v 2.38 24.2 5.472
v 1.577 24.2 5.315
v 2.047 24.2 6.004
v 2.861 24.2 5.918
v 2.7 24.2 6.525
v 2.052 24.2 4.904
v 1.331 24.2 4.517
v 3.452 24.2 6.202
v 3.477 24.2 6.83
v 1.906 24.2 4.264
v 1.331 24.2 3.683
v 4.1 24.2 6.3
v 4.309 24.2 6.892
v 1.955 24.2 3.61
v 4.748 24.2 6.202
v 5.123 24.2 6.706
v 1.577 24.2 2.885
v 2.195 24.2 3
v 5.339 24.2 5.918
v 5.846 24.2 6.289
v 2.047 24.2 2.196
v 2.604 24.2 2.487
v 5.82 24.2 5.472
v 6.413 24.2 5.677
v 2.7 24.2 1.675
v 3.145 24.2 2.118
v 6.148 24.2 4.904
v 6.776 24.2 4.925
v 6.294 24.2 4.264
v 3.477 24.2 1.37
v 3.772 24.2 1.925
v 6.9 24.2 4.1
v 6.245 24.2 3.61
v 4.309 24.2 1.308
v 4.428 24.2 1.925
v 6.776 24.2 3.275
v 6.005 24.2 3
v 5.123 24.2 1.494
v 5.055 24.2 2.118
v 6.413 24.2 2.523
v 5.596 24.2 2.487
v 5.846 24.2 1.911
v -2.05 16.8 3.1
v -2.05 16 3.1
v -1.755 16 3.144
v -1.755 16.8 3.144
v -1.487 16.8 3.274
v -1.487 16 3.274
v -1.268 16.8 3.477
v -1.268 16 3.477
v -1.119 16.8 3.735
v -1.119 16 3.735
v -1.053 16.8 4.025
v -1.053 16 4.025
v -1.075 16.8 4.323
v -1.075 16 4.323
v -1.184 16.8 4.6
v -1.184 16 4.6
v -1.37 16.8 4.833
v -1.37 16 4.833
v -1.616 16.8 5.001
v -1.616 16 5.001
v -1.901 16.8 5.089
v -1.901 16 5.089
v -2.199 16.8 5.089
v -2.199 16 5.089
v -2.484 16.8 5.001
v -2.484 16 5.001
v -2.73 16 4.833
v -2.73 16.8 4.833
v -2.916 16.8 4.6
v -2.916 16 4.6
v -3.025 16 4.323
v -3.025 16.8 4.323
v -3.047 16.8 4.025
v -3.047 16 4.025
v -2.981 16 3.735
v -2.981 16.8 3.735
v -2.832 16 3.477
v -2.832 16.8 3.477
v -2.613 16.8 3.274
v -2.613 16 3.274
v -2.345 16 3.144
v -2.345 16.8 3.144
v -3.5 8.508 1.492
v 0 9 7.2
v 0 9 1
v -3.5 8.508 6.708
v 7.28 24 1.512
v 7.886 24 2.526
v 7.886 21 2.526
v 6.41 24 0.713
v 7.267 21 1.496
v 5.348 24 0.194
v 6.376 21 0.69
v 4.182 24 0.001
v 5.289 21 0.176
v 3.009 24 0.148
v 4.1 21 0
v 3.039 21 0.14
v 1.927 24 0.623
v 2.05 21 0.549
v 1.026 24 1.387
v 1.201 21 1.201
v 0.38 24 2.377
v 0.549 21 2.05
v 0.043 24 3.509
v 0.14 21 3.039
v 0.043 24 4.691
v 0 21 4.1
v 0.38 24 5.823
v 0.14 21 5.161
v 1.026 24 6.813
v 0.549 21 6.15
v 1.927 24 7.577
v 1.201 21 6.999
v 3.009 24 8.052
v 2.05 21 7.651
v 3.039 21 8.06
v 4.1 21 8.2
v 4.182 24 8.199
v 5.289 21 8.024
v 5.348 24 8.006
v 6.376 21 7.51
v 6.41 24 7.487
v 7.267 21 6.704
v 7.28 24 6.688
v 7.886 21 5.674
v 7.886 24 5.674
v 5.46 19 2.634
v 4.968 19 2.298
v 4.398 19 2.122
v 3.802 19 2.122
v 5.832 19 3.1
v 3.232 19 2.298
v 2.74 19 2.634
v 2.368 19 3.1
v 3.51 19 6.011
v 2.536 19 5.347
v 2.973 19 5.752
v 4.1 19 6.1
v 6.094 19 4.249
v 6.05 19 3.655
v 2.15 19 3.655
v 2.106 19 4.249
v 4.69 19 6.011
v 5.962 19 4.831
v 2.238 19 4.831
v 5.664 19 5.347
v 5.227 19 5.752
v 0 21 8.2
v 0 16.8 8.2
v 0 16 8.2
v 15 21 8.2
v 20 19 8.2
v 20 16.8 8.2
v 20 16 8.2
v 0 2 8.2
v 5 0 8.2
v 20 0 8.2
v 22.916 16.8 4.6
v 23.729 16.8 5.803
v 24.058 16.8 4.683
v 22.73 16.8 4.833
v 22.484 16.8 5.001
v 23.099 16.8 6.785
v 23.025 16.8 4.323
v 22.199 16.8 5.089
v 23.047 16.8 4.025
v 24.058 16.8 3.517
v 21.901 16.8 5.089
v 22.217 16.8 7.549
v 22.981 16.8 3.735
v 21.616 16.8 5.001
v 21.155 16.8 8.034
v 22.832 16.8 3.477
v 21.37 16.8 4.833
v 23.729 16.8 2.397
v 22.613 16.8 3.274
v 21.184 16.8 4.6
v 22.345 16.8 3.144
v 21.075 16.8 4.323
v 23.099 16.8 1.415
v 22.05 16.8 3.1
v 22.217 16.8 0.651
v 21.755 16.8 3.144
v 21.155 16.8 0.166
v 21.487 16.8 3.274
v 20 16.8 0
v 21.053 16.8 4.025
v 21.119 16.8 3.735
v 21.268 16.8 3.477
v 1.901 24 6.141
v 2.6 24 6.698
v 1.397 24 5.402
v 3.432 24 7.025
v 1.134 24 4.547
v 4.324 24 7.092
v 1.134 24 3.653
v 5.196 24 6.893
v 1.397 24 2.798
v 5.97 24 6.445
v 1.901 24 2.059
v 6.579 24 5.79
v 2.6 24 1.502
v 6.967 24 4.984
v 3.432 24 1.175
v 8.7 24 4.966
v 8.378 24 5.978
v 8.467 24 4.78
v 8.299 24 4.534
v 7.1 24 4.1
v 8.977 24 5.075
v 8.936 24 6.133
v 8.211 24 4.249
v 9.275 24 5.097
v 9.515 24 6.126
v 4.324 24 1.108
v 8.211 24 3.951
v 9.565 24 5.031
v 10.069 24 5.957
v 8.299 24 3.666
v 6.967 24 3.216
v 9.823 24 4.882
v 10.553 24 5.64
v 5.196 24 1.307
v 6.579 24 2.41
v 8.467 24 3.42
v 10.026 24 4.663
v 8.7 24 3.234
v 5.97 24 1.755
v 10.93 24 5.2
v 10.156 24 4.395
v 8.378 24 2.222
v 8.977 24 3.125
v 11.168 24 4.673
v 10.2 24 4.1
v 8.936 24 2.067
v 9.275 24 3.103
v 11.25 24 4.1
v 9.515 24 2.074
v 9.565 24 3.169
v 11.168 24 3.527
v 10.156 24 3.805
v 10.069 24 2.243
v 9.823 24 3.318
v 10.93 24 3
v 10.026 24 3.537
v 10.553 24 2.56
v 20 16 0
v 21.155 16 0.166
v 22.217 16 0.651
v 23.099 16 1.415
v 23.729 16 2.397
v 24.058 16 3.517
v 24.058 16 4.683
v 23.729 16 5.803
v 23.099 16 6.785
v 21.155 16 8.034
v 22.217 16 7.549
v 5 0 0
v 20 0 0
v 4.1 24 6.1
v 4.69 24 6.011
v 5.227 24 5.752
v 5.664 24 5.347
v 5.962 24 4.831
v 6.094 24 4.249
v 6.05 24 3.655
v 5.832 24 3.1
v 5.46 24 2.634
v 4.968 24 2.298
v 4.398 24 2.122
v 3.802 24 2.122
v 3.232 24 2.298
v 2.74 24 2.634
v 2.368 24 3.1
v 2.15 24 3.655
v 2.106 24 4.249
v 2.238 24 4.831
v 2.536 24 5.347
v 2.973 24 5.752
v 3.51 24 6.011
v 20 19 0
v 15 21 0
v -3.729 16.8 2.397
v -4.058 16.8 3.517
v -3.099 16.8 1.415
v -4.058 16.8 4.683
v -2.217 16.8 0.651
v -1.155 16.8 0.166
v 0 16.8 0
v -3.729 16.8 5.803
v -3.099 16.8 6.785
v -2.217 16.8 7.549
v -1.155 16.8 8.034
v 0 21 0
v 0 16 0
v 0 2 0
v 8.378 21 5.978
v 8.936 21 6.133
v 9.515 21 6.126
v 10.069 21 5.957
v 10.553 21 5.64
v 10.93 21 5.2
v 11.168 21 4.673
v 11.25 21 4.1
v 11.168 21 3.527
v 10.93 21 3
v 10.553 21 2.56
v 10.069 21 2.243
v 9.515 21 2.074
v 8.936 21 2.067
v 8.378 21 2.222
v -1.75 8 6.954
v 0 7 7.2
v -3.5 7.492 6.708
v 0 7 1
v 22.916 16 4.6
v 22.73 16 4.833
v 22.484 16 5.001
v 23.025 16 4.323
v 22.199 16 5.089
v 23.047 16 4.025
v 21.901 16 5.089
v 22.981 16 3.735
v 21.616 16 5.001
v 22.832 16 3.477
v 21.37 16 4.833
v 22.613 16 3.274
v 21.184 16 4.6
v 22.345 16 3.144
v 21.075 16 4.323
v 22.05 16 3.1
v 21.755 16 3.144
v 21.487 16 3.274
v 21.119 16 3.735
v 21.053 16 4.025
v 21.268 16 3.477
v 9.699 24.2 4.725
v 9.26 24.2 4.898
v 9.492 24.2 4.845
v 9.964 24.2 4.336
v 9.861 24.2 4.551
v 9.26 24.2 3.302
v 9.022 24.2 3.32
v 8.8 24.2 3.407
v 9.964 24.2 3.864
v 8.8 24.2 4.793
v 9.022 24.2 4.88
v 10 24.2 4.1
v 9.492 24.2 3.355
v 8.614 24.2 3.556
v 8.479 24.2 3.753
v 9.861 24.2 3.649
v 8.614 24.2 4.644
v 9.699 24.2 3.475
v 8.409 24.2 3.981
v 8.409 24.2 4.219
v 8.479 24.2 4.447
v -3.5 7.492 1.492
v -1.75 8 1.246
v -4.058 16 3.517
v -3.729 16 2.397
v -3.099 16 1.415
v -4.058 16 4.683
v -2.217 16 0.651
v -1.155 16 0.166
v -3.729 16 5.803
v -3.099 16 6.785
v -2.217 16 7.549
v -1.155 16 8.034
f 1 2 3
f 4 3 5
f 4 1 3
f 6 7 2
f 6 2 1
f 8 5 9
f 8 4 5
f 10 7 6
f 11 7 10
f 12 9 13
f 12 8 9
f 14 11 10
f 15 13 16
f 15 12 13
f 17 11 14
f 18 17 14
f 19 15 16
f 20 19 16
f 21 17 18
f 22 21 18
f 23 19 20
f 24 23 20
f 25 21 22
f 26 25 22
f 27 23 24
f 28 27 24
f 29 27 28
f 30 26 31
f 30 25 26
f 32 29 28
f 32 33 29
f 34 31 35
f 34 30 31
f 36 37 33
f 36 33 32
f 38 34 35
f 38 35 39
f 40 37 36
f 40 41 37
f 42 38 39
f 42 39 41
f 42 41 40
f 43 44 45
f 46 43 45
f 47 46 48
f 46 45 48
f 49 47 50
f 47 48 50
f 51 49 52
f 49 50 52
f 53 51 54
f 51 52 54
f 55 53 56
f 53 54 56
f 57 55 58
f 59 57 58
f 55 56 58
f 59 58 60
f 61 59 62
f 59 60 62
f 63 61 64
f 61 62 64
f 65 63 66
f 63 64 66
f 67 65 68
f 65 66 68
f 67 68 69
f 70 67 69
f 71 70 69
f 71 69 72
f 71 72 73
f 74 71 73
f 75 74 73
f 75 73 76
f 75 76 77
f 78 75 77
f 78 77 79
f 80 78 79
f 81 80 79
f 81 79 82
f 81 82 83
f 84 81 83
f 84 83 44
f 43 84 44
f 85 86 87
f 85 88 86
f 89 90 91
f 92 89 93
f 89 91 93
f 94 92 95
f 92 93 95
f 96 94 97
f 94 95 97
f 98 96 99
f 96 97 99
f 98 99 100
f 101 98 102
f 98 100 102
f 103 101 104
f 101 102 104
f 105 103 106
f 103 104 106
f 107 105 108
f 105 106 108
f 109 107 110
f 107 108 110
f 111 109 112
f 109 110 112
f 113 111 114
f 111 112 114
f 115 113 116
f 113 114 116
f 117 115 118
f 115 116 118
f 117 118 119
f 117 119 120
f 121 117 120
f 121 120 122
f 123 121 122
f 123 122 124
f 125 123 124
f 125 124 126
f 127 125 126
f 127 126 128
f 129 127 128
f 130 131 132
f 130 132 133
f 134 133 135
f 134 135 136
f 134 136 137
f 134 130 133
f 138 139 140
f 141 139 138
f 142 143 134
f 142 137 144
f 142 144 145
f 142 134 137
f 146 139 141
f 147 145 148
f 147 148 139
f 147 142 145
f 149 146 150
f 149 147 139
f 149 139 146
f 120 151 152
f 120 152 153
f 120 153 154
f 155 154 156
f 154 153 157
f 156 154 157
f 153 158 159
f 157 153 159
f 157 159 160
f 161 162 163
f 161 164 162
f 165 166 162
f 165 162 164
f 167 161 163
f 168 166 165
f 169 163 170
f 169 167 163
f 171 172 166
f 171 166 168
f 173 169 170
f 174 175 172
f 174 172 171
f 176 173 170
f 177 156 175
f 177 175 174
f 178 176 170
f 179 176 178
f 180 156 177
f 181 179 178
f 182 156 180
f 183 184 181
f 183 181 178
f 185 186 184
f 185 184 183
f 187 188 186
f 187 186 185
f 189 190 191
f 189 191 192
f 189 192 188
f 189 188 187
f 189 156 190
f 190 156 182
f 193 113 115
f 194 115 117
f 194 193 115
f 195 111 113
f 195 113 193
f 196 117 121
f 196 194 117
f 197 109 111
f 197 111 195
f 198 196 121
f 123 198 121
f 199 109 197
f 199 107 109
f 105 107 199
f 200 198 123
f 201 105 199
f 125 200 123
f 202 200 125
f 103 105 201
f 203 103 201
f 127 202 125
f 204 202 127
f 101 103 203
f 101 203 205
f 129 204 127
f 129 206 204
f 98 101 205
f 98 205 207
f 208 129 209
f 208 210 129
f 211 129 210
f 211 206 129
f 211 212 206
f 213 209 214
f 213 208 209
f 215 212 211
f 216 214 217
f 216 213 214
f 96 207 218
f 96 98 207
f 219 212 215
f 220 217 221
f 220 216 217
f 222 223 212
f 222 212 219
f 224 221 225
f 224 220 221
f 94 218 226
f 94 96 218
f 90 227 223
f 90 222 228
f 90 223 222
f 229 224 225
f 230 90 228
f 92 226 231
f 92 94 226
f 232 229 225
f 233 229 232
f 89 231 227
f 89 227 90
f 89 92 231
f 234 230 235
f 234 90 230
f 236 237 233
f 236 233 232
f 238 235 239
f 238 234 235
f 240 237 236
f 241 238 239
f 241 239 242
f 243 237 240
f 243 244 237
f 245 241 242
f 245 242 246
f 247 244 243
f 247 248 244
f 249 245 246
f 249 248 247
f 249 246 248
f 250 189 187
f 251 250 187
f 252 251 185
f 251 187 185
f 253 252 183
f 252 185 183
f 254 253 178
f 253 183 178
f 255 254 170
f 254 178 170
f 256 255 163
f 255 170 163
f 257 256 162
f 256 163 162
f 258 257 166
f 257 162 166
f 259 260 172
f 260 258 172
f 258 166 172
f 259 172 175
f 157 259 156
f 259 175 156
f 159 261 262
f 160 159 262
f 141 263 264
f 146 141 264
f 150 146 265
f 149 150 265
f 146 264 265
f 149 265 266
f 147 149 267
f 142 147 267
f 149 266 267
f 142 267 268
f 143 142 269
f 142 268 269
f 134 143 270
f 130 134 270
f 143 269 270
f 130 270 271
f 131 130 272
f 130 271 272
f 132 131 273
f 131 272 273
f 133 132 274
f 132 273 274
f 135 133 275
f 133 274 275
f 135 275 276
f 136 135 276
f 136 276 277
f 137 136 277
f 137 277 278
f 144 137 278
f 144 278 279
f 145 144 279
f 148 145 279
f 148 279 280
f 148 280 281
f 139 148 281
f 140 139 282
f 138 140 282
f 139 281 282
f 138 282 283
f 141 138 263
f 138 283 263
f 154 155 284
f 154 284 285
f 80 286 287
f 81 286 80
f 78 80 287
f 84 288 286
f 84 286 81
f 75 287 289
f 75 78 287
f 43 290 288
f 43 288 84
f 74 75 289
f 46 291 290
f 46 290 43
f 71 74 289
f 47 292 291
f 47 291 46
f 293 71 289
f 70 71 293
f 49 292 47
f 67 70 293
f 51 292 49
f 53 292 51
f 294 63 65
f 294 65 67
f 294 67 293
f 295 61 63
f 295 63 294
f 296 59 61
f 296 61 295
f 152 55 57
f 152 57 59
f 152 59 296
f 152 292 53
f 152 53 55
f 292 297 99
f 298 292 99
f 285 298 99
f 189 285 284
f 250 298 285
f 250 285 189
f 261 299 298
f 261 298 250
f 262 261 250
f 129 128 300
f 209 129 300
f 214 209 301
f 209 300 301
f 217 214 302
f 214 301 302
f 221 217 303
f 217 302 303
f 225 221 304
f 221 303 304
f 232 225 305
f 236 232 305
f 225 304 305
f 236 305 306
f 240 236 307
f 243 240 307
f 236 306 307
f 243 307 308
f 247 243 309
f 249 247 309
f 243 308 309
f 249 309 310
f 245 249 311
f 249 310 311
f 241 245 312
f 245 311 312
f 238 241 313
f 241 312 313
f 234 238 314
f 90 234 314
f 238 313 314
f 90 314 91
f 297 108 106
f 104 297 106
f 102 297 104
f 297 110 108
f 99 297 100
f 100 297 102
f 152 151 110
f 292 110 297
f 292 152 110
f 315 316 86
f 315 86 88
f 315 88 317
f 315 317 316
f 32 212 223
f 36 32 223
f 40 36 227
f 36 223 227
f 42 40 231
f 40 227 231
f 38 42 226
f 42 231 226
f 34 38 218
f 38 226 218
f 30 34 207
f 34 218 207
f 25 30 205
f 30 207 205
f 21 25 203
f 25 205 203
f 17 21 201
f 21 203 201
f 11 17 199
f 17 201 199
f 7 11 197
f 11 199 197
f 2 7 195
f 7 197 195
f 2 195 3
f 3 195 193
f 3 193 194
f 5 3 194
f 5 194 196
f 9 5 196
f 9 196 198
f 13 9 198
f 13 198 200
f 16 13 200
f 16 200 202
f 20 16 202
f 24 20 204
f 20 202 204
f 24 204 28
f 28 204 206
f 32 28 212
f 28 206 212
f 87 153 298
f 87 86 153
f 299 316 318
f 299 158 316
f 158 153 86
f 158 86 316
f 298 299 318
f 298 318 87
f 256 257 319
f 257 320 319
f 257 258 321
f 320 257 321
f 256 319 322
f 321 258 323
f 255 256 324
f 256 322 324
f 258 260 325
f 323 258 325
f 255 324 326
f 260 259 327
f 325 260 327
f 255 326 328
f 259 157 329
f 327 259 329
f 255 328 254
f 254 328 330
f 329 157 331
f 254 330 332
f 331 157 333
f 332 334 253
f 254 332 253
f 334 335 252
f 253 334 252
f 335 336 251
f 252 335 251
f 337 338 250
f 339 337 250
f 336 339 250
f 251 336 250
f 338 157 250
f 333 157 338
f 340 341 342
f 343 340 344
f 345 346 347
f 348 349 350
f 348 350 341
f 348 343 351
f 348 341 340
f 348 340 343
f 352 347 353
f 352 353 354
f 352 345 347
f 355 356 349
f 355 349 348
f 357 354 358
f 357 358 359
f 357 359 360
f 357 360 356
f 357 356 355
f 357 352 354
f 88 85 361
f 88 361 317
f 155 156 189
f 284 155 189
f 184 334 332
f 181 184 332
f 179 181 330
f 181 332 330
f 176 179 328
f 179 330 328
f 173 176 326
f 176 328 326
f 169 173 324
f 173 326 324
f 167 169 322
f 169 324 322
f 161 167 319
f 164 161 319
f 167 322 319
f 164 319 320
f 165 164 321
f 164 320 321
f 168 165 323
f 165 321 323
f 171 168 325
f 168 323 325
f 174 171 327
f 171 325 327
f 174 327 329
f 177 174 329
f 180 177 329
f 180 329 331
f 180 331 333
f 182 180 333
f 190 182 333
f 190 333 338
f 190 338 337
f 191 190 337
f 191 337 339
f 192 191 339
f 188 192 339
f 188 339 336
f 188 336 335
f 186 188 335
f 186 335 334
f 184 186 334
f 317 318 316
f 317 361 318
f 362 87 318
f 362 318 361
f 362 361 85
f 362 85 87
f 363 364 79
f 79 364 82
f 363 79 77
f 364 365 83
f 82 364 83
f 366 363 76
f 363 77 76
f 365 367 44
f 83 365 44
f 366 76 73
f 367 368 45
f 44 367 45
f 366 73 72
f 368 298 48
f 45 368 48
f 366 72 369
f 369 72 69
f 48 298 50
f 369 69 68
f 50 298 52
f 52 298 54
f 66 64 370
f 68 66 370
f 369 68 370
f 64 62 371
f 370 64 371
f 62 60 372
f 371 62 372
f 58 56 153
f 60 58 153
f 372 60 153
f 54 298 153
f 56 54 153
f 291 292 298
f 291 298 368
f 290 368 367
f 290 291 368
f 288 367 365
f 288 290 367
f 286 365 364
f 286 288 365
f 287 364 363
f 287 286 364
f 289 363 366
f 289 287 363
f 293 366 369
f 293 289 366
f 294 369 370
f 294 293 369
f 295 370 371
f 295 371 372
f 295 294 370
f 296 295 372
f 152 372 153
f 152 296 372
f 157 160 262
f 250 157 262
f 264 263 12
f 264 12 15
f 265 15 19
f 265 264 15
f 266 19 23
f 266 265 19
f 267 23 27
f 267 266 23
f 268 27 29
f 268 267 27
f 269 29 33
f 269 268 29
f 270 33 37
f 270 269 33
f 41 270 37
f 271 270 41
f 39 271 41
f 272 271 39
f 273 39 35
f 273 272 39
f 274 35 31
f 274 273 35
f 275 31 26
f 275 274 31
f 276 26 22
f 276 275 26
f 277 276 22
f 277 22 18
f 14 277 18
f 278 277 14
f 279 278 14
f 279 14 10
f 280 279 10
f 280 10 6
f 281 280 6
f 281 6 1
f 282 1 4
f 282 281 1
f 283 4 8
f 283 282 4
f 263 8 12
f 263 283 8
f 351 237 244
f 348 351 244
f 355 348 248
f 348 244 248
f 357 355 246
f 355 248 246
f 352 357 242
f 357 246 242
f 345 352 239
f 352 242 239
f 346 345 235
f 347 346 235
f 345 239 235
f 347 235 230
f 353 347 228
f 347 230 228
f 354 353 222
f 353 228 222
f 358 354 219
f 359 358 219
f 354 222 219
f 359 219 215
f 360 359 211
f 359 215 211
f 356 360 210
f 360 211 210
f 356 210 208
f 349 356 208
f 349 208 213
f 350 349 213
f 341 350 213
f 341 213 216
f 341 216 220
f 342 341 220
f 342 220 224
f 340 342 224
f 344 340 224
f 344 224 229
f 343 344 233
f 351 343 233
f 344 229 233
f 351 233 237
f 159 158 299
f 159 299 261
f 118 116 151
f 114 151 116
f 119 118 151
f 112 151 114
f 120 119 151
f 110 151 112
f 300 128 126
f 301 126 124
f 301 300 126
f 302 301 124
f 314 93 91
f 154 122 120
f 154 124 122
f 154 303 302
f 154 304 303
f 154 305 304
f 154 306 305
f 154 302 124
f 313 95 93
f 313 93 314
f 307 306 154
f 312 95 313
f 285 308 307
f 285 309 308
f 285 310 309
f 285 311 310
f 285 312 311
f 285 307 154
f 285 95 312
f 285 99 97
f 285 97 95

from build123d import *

# Parameters (mm, degrees)
SKETCH1_W                      = 20
SKETCH1_H                      = 8.2
BOSS_EXTRUDE1_DEPTH            = 21
SKETCH2_W                      = 8.2
SKETCH2_H                      = 0.8
BOSS_EXTRUDE2_DEPTH            = 5
SKETCH3_W                      = 8.2
SKETCH3_H                      = 0.8
BOSS_EXTRUDE3_DEPTH            = 5
CUT_EXTRUDE1_REACH             = 35.664
CUT_EXTRUDE2_REACH             = 33.217
F_2_0_2_DIAMETER_HOLE1_D       = 2
BOSS_EXTRUDE6_DEPTH            = 3
CUT_EXTRUDE4_REACH             = 36.986
SKETCH12_W                     = 6.2
SKETCH12_H                     = 2
BOSS_EXTRUDE7_DEPTH            = 3.5
BOSS_EXTRUDE7_TAPER            = 8
SKETCH15_R                     = 2
CUT_EXTRUDE5_DEPTH             = 5
SKETCH17_R                     = 3
SKETCH17_R_2                   = 2
BOSS_EXTRUDE10_DEPTH           = 0.2
BOSS_EXTRUDE10_DRAFT           = 45
SKETCH17_R_3                   = 1
BOSS_EXTRUDE10_PROFILE_2_DEPTH = 0.2
BOSS_EXTRUDE10_PROFILE_2_DRAFT = 45


with BuildPart() as part:
    # Sketch1 → Boss-Extrude1 (new body)
    with BuildSketch(Plane(origin=(0, 0, 0), x_dir=(1, 0, 0), z_dir=(0, 1, 0))):
        with Locations((10, -4.1)):
            Rectangle(SKETCH1_W, SKETCH1_H)
    extrude(amount=BOSS_EXTRUDE1_DEPTH)

    # Sketch2 → Boss-Extrude2 (add)
    with BuildSketch(Plane(origin=(20, 0, 0), x_dir=(0, 0, -1), z_dir=(1, 0, 0))):
        with Locations((-4.1, 16.4)):
            Rectangle(SKETCH2_W, SKETCH2_H)
    extrude(amount=BOSS_EXTRUDE2_DEPTH)

    # Sketch3 → Boss-Extrude3 (add)
    with BuildSketch(Plane.ZY):
        with Locations((4.1, 16.4)):
            Rectangle(SKETCH3_W, SKETCH3_H)
    extrude(amount=BOSS_EXTRUDE3_DEPTH)

    # Sketch4 → Cut-Extrude1 (cut, up to next)
    with BuildSketch(Plane.XY.offset(8.2), mode=Mode.PRIVATE) as cut_extrude1_sk1:
        Polygon((20, 19), (15, 21), (20, 21), align=None)
    cut_extrude1_tool1 = extrude(cut_extrude1_sk1.sketch, amount=-CUT_EXTRUDE1_REACH, mode=Mode.PRIVATE) & part.part
    add(cut_extrude1_tool1.solids().sort_by_distance((18.333333, 20.333333, 8.2))[0], mode=Mode.SUBTRACT)

    # Sketch8 → Cut-Extrude2 (cut, up to next)
    with BuildSketch(Plane(origin=(0, 16.8, 0), x_dir=(1, 0, 0), z_dir=(0, 1, 0)), mode=Mode.PRIVATE) as cut_extrude2_sk1:
        with BuildLine():
            Line((-5, 0), (0, 0))
            ThreePointArc((0, 0), (-4.1, -4.1), (0, -8.2))
            Line((0, -8.2), (-5, -8.2))
            Line((-5, -8.2), (-5, 0))
        make_face()
    cut_extrude2_tool1 = extrude(cut_extrude2_sk1.sketch, amount=-CUT_EXTRUDE2_REACH, mode=Mode.PRIVATE) & part.part
    # Sketch8 → Cut-Extrude2 (cut, up to next)
    with BuildSketch(Plane(origin=(0, 16.8, 0), x_dir=(1, 0, 0), z_dir=(0, 1, 0)), mode=Mode.PRIVATE) as cut_extrude2_sk2:
        with BuildLine():
            Line((20, -8.2), (25, -8.2))
            Line((25, -8.2), (25, 0))
            Line((25, 0), (20, 0))
            ThreePointArc((20, 0), (24.1, -4.1), (20, -8.2))
        make_face()
    cut_extrude2_tool2 = extrude(cut_extrude2_sk2.sketch, amount=-CUT_EXTRUDE2_REACH, mode=Mode.PRIVATE) & part.part
    add(cut_extrude2_tool1.solids().sort_by_distance((-2.5, 16.8, 8.103958))[0], mode=Mode.SUBTRACT)
    add(cut_extrude2_tool2.solids().sort_by_distance((24.196042, 16.8, 4.1))[0], mode=Mode.SUBTRACT)

    # Ø2.0 (2) Diameter Hole1 (through all)
    with Locations(Plane(origin=(-2.05, 16.8, 4.1), x_dir=(0, 0, 1), z_dir=(0, 1, 0))):
        with Locations((0, 0), (0, 24.1)):
            Hole(F_2_0_2_DIAMETER_HOLE1_D / 2)

    # Sketch10 → Boss-Extrude6 (add)
    with BuildSketch(Plane(origin=(0, 21, 0), x_dir=(1, 0, 0), z_dir=(0, 1, 0))):
        with BuildLine():
            ThreePointArc((7.886029412, -2.526474883), (0, -4.1), (7.886029412, -5.673525117))
            ThreePointArc((7.886029412, -5.673525117), (11.25, -4.1), (7.886029412, -2.526474883))
        make_face()
    extrude(amount=BOSS_EXTRUDE6_DEPTH)

    # Sketch11 → Cut-Extrude4 (cut, up to next)
    with BuildSketch(Plane.XY.offset(8.2), mode=Mode.PRIVATE) as cut_extrude4_sk1:
        Polygon((0, 0), (0, 2), (5, 0), align=None)
    cut_extrude4_tool1 = extrude(cut_extrude4_sk1.sketch, amount=-CUT_EXTRUDE4_REACH, mode=Mode.PRIVATE) & part.part
    add(cut_extrude4_tool1.solids().sort_by_distance((1.666667, 0.666667, 8.2))[0], mode=Mode.SUBTRACT)

    # Sketch12 → Boss-Extrude7 (add)
    with BuildSketch(Plane.ZY):
        with Locations((4.1, 8)):
            Rectangle(SKETCH12_W, SKETCH12_H)
    extrude(amount=BOSS_EXTRUDE7_DEPTH, taper=BOSS_EXTRUDE7_TAPER)

    # Sketch15 → Cut-Extrude5 (cut)
    with BuildSketch(Plane(origin=(0, 24, 0), x_dir=(1, 0, 0), z_dir=(0, 1, 0))):
        with Locations(Location((4.1, -4.1, 0), (0, 0, 270))):
            Circle(SKETCH15_R)
    extrude(amount=-CUT_EXTRUDE5_DEPTH, mode=Mode.SUBTRACT)


with BuildPart() as boss_extrude10_tool:
    # Sketch17 → Boss-Extrude10 (with draft: the straight prism first)
    with BuildSketch(Plane(origin=(0, 24, 0), x_dir=(1, 0, 0), z_dir=(0, 1, 0))):
        with Locations((4.1, -4.1)):
            Circle(SKETCH17_R)
        with Locations(Location((4.1, -4.1, 0), (0, 0, 270))):
            Circle(SKETCH17_R_2, mode=Mode.SUBTRACT)
    extrude(amount=BOSS_EXTRUDE10_DEPTH)
    # Boss-Extrude10: the draft: its side faces are tilted about the plane it starts from
    boss_extrude10_sides = [boss_extrude10_tool.faces().sort_by_distance(p)[0] for p in [
        (1.1, 24.1, 4.1),
        (4.1, 24.1, 2.1),
    ]]
    draft(boss_extrude10_sides, Plane(origin=(0, 24, 0), x_dir=(1, 0, 0), z_dir=(0, 1, 0)), BOSS_EXTRUDE10_DRAFT)


with BuildPart() as part_1:
    add(part.part)

    # Boss-Extrude10: add boss_extrude10_tool
    add(boss_extrude10_tool.part)


with BuildPart() as boss_extrude10_profile_2_tool:
    # Sketch17 → Boss-Extrude10 profile 2 (with draft: the straight prism first)
    with BuildSketch(Plane(origin=(0, 24, 0), x_dir=(1, 0, 0), z_dir=(0, 1, 0))):
        with Locations((9.2, -4.1)):
            Circle(SKETCH17_R_3)
    extrude(amount=BOSS_EXTRUDE10_PROFILE_2_DEPTH)
    # Boss-Extrude10 profile 2: the draft: its side faces are tilted about the plane it starts from
    boss_extrude10_profile_2_sides = [boss_extrude10_profile_2_tool.faces().sort_by_distance(p)[0] for p in [
        (8.2, 24.1, 4.1),
    ]]
    draft(boss_extrude10_profile_2_sides, Plane(origin=(0, 24, 0), x_dir=(1, 0, 0), z_dir=(0, 1, 0)), BOSS_EXTRUDE10_PROFILE_2_DRAFT)


with BuildPart() as part_2:
    add(part_1.part)

    # Boss-Extrude10 profile 2: add boss_extrude10_profile_2_tool
    add(boss_extrude10_profile_2_tool.part)


solid = part_2.part
